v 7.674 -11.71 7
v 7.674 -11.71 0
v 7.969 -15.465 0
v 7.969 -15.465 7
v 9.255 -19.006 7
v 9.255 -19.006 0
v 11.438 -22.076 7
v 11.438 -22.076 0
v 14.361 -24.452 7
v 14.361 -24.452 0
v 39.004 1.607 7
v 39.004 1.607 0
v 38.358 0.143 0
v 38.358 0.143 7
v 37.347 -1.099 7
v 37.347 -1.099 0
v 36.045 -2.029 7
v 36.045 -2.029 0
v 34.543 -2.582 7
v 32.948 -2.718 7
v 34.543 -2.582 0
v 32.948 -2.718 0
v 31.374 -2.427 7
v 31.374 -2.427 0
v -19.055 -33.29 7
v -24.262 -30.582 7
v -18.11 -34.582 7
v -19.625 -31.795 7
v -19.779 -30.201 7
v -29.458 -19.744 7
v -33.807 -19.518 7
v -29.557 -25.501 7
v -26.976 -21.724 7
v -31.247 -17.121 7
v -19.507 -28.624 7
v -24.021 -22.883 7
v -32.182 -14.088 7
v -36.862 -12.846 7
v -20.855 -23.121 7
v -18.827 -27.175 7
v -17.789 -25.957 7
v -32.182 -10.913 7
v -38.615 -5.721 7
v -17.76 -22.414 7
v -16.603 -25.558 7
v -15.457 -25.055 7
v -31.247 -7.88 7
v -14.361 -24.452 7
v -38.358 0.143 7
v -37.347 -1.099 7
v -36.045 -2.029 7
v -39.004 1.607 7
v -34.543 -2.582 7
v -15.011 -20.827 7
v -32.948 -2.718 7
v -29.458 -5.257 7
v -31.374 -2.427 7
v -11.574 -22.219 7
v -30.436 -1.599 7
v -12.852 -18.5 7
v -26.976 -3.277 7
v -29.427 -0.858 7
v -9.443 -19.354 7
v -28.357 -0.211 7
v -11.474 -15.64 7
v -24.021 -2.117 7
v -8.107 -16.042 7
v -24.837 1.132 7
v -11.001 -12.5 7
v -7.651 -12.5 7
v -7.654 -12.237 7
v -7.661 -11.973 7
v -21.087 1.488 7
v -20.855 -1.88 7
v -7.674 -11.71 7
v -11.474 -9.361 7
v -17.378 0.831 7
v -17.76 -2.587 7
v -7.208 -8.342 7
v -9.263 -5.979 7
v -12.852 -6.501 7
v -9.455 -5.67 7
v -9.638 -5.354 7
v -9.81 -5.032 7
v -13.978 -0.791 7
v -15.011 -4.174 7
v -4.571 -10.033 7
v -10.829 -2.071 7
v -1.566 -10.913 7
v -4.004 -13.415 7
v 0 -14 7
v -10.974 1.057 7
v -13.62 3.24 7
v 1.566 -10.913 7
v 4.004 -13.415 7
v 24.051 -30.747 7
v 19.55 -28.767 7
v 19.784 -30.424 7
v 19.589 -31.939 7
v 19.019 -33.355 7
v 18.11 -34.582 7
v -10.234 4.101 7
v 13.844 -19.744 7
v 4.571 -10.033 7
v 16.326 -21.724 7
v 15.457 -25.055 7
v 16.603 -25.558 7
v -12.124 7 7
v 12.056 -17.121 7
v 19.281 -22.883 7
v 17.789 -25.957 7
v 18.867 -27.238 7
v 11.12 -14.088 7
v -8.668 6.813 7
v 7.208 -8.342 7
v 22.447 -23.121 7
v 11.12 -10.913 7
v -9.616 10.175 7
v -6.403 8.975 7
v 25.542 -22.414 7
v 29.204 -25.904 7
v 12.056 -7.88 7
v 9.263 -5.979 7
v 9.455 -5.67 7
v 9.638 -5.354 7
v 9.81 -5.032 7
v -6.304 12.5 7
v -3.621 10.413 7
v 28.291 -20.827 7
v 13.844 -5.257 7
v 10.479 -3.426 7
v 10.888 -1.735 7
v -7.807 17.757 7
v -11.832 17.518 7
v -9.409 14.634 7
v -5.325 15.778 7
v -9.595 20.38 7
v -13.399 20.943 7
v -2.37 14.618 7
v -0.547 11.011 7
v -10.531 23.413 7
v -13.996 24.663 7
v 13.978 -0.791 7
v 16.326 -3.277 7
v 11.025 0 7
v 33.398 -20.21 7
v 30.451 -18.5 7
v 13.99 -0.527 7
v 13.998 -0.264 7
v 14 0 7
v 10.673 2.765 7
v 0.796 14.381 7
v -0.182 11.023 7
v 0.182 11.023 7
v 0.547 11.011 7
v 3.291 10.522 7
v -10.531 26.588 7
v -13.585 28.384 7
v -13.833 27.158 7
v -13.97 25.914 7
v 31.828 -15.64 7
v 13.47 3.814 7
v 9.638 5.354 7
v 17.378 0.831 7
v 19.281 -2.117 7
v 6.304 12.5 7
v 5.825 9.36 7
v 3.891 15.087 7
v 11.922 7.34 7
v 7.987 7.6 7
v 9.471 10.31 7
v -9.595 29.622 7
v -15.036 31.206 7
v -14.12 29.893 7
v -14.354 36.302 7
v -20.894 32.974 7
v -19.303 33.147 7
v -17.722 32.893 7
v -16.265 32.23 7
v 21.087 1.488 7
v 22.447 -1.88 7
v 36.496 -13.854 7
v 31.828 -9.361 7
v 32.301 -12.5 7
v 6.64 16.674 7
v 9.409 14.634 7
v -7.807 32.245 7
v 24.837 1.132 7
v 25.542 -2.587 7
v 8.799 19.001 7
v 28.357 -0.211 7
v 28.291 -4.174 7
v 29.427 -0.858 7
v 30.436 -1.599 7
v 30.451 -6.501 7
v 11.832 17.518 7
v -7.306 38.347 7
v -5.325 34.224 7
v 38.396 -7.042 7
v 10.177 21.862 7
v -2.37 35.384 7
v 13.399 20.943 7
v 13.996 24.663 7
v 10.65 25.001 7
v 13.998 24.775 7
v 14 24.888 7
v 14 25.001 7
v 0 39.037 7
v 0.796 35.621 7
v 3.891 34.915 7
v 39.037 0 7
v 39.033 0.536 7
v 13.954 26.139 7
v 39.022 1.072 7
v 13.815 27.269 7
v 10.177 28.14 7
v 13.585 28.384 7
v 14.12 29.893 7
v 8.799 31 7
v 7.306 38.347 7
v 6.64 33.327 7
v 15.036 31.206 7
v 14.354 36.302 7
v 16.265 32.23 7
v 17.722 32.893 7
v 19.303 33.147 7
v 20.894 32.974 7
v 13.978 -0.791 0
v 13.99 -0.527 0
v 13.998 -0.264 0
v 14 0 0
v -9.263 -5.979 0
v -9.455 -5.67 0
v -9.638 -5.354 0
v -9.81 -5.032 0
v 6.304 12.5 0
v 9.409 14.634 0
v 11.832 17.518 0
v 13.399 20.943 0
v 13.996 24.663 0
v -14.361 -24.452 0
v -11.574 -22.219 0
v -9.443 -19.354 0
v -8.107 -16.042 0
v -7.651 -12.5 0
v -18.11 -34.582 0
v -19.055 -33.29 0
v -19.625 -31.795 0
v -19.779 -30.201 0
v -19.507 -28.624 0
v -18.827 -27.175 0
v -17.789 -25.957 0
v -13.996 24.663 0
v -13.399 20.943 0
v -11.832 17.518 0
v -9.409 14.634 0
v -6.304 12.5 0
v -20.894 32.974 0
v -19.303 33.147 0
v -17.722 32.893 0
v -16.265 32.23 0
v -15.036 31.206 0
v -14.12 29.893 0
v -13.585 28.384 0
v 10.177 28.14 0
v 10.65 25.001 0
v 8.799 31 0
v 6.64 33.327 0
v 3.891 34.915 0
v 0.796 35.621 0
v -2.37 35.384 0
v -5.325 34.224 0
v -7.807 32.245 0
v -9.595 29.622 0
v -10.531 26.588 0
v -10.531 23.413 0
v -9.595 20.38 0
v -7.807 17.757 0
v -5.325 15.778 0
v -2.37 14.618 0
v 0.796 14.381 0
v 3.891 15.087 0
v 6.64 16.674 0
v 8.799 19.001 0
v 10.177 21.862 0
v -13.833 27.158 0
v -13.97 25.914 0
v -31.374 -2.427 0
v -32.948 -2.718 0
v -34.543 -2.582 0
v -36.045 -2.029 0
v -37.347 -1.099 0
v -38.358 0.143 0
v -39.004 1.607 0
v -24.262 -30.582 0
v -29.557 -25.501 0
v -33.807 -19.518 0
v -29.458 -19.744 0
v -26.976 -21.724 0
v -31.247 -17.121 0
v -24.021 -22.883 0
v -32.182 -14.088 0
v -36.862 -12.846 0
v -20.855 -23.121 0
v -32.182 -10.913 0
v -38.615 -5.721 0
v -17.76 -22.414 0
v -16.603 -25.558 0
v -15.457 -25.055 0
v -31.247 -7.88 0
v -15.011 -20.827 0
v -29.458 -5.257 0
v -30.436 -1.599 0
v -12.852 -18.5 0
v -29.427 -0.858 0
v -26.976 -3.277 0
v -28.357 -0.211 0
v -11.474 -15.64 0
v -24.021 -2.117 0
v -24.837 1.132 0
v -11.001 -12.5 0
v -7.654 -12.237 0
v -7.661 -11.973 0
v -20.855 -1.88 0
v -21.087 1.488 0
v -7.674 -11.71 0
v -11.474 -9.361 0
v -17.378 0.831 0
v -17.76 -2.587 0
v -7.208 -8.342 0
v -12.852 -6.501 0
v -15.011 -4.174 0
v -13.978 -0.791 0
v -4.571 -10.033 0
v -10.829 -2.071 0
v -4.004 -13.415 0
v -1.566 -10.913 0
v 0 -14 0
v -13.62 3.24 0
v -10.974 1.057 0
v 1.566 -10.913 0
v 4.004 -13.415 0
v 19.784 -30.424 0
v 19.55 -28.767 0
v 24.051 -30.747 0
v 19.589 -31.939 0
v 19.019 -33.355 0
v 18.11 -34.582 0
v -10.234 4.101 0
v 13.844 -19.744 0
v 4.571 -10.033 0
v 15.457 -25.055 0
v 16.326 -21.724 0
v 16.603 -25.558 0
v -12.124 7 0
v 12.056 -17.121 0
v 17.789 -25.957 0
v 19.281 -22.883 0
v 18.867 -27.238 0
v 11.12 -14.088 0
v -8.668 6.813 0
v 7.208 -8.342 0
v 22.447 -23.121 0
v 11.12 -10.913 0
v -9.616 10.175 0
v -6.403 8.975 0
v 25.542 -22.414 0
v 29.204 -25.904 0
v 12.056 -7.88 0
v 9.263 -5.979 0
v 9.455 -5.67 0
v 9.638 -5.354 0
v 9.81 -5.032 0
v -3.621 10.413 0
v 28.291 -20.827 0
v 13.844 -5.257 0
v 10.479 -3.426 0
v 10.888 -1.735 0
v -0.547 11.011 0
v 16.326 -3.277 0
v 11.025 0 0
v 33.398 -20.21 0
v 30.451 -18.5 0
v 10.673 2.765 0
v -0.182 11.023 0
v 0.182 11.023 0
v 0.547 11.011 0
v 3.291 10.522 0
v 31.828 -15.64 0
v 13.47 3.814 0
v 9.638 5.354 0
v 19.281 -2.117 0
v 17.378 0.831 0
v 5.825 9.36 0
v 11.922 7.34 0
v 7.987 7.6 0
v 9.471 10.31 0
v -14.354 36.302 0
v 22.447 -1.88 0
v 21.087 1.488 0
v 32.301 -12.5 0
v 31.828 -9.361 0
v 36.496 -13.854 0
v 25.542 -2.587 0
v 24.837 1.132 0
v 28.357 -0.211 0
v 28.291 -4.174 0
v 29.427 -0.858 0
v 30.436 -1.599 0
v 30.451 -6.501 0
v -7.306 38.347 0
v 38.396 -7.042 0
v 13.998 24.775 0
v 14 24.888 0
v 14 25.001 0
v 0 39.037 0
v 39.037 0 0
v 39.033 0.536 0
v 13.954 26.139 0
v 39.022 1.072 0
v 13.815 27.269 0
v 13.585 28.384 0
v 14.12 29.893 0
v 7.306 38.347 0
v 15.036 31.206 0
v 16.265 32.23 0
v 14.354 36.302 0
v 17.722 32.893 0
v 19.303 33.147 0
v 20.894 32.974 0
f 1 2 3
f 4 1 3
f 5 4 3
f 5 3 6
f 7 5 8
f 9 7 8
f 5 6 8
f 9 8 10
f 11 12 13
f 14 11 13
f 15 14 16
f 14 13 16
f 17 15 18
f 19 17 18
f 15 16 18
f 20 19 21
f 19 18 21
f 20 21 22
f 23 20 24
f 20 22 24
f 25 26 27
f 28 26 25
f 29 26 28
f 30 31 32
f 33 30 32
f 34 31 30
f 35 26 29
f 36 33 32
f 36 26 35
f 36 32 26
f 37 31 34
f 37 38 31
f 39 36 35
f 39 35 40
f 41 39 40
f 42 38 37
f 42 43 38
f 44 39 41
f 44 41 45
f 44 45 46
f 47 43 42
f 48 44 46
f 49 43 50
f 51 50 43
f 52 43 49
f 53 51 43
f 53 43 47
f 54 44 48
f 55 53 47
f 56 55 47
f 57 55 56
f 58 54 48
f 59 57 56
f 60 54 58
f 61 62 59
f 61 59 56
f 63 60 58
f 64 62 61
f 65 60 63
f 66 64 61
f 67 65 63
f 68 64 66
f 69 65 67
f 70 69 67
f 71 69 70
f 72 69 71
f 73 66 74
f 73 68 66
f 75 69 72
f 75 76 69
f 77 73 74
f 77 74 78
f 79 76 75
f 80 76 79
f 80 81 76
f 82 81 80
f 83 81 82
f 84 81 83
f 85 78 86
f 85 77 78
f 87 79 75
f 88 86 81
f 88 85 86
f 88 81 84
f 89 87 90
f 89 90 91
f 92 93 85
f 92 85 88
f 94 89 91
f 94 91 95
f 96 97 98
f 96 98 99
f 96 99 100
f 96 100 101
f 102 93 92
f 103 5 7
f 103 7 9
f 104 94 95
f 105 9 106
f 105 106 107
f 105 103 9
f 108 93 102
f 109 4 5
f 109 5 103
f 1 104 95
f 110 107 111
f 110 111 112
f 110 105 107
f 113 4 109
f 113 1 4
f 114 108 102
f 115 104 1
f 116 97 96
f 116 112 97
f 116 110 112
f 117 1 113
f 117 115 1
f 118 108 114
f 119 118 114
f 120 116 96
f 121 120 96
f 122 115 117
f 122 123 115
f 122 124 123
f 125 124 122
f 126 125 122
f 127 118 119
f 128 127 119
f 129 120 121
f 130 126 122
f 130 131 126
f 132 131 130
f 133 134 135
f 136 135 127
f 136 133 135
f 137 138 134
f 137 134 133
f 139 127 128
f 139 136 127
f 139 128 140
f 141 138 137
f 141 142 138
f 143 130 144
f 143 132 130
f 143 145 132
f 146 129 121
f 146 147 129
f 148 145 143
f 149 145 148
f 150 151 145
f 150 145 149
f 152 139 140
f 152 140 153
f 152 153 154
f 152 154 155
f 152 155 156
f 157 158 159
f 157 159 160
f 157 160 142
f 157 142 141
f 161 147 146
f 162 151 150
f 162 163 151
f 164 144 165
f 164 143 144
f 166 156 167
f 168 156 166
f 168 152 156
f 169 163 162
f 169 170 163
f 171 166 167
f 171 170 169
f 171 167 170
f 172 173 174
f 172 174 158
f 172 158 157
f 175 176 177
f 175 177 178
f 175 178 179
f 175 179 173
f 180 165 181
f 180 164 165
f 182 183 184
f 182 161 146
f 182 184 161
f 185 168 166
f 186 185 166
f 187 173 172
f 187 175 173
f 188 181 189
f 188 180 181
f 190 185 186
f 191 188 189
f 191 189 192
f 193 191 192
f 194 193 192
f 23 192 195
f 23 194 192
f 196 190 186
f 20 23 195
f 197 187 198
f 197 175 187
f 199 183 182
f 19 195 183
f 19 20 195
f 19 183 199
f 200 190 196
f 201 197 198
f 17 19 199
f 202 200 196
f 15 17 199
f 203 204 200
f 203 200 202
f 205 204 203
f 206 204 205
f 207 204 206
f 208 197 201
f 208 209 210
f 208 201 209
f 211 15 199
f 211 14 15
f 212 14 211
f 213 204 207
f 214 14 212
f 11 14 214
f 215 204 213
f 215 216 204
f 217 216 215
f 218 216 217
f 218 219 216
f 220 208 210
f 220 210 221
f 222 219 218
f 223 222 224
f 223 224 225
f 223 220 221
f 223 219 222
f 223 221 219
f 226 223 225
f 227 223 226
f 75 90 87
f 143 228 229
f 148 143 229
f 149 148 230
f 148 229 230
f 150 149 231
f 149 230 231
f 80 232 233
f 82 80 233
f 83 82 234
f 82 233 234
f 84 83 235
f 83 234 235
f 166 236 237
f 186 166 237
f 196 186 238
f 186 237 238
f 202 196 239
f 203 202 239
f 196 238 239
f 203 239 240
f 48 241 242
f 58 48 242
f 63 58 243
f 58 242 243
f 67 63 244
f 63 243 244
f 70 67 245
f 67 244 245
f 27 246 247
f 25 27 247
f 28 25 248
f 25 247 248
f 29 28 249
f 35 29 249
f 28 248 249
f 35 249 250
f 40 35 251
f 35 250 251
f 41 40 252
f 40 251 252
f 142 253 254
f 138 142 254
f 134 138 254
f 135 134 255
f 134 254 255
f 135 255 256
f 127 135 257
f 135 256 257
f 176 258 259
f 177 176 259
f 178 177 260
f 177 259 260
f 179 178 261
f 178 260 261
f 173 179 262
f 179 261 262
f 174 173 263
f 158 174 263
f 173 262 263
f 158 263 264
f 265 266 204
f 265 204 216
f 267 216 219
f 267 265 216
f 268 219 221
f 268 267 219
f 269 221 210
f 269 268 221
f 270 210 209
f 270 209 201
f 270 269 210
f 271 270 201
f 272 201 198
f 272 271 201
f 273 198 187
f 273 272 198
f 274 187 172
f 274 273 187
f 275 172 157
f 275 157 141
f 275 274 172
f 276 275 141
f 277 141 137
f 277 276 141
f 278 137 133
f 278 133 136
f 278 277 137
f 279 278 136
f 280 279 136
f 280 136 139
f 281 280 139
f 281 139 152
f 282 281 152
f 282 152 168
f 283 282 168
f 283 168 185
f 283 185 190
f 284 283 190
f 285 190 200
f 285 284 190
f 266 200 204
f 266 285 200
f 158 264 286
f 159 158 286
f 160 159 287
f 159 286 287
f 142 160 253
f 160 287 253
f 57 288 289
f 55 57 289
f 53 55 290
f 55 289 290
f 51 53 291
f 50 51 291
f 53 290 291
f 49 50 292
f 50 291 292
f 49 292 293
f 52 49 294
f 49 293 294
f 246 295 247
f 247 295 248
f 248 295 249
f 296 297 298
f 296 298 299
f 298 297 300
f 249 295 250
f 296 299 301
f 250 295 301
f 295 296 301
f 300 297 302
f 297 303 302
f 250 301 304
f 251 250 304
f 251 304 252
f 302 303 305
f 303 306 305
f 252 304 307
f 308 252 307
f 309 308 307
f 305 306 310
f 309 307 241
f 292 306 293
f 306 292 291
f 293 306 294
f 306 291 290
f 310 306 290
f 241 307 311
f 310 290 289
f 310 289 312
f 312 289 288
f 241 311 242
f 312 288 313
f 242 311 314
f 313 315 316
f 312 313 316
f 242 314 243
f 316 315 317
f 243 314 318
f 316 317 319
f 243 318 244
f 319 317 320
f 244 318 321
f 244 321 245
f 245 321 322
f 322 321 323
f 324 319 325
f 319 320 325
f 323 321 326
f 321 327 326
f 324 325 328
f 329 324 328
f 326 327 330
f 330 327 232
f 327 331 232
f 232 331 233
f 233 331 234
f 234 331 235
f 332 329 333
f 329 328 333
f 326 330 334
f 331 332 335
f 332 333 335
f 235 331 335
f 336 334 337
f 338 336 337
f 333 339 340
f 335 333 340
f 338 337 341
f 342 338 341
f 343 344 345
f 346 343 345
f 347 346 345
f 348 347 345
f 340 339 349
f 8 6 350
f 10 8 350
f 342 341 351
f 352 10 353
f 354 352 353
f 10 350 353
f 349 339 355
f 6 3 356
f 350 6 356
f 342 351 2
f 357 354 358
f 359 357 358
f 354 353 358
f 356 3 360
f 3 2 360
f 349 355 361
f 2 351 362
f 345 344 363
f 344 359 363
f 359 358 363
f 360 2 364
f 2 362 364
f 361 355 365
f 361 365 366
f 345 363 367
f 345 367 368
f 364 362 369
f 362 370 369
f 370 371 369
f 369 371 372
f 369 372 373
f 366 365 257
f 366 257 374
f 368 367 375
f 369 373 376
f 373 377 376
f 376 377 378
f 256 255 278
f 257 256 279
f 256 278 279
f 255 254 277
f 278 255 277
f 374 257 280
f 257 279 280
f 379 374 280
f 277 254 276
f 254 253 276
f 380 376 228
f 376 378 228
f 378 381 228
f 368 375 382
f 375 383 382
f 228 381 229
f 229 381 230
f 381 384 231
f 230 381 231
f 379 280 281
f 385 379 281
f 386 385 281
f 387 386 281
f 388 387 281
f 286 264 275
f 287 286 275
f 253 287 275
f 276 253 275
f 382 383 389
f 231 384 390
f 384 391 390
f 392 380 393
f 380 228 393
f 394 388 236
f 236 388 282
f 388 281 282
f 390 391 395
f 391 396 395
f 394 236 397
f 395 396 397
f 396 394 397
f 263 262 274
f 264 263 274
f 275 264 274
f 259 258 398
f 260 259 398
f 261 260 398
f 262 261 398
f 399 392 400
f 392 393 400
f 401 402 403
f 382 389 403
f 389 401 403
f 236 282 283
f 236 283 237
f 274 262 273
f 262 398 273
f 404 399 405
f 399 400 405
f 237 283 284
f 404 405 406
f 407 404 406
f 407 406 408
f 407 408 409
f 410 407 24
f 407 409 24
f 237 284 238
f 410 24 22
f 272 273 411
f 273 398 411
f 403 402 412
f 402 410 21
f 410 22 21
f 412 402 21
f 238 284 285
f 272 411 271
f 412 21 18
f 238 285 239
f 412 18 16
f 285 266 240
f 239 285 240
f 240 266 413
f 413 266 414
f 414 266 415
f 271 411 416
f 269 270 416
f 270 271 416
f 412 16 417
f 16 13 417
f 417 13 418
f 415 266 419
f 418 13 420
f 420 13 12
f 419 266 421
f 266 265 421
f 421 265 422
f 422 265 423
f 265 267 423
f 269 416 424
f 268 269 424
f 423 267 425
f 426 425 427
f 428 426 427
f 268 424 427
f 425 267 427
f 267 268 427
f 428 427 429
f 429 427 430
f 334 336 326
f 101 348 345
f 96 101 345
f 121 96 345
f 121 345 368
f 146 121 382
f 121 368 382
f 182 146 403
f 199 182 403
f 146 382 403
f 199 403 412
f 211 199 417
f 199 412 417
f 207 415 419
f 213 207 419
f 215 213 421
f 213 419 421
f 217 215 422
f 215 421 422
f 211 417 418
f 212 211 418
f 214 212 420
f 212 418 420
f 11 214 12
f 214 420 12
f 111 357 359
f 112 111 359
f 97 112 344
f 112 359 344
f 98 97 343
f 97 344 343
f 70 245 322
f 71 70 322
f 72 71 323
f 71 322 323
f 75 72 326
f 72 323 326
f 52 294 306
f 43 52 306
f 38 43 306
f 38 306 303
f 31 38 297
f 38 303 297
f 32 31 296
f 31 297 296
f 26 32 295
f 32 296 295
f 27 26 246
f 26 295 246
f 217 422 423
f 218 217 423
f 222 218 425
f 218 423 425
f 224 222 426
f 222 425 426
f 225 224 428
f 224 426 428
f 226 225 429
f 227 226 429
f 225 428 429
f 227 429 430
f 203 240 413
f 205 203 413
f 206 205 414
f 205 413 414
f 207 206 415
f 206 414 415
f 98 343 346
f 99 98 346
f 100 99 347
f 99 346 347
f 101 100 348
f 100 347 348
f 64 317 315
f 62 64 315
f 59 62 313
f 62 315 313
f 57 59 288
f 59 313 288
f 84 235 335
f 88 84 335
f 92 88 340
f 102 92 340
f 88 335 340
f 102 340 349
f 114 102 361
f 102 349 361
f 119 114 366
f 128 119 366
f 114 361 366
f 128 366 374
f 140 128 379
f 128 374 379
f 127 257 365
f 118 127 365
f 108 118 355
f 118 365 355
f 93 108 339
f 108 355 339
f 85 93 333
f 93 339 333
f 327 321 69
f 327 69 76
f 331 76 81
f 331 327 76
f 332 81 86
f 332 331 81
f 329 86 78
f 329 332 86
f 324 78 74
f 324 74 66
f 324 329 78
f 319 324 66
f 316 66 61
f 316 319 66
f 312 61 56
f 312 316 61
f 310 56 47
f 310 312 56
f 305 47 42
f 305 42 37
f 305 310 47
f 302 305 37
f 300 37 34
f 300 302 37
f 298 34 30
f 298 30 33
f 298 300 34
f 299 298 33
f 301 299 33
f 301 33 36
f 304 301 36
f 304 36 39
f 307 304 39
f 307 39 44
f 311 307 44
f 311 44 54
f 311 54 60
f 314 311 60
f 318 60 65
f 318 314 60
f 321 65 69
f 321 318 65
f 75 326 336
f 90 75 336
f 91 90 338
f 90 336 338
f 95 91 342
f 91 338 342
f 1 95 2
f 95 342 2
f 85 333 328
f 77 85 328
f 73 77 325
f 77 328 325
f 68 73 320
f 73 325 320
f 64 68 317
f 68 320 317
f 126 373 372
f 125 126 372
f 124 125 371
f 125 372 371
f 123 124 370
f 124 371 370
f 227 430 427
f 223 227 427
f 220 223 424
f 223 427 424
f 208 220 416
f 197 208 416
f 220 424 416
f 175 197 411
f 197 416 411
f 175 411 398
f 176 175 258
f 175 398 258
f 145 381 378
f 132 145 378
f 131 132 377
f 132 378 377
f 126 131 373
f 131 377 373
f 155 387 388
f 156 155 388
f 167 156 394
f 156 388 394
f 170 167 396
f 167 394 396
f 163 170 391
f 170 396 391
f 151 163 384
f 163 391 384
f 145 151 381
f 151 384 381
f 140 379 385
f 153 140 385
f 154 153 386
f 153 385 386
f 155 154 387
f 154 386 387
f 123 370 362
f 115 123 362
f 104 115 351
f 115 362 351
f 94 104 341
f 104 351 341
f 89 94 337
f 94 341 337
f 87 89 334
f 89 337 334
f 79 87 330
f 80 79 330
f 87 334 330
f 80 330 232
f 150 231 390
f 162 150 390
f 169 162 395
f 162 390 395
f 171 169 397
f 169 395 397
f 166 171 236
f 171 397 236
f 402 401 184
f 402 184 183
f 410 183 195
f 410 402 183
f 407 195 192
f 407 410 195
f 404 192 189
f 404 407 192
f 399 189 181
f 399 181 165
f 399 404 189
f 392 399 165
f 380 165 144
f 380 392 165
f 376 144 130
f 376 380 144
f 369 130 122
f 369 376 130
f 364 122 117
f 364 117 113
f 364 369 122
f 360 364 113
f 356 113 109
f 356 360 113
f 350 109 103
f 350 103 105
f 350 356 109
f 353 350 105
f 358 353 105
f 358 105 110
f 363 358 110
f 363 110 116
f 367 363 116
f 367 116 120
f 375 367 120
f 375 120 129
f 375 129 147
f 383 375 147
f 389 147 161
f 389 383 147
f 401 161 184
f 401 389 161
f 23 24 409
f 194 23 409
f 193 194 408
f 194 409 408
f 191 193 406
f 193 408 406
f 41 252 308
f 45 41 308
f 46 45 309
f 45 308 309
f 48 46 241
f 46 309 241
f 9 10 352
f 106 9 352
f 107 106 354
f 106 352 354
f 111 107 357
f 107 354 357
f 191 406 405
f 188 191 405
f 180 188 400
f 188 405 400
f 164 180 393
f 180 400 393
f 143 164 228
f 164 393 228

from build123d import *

# Parameters (mm, degrees)
F0_R     = 10.65
F1_DEPTH = 7


with BuildPart() as f1:
    # F0 (on Top) → F1 (new body)
    with BuildSketch(Plane.XY):
        with BuildLine():
            ThreePointArc((-13.5850223899, 28.3841313799), (0, 39.0007652062), (13.5850223899, 28.3841313799))
            ThreePointArc((13.5850223899, 28.3841313799), (16.2654595363, 32.2301803319), (20.8939522359, 32.9744189809))
            ThreePointArc((20.8939522359, 32.9744189809), (0, 39.0367717308), (-20.8939522359, 32.9744189809))
            ThreePointArc((-20.8939522359, 32.9744189809), (-16.2654595363, 32.2301803319), (-13.5850223899, 28.3841313799))
        make_face()
        with BuildLine():
            ThreePointArc((-17.7888676444, -25.9570401906), (-33.7756534356, -19.5003826031), (-31.3738900343, -2.4270911893))
            ThreePointArc((-31.3738900343, -2.4270911893), (-36.0448847041, -2.0287890033), (-39.0036606305, 1.6074839313))
            ThreePointArc((-39.0036606305, 1.6074839313), (-33.8068360006, -19.5183858654), (-18.1097083945, -34.5819029122))
            ThreePointArc((-18.1097083945, -34.5819029122), (-19.7794251679, -30.2013913286), (-17.7888676444, -25.9570401906))
        make_face()
        with BuildLine():
            ThreePointArc((39.0036606305, 1.6074839313), (36.0448847041, -2.0287890033), (31.3738900343, -2.4270911893))
            ThreePointArc((31.3738900343, -2.4270911893), (34.537652805, -7.0284675601), (35.6512977827, -12.5003826031))
            ThreePointArc((35.6512977827, -12.5003826031), (30.0752510726, -23.6823775489), (17.7888676444, -25.9570401906))
            ThreePointArc((17.7888676444, -25.9570401906), (19.2622478562, -27.9781893195), (19.783572277, -30.424434176))
            ThreePointArc((19.783572277, -30.424434176), (19.3493973149, -32.6653249916), (18.1097083945, -34.5819029122))
            ThreePointArc((18.1097083945, -34.5819029122), (33.3977102499, -20.2104551465), (39.0367717308, 0))
            ThreePointArc((39.0367717308, 0), (39.0284930779, 0.8039124539), (39.0036606305, 1.6074839313))
        make_face()
        with BuildLine():
            ThreePointArc((-6.3040014892, 12.5003826031), (0, 14), (6.3040014892, 12.5003826031))
            ThreePointArc((6.3040014892, 12.5003826031), (11.832295091, 17.5176647206), (13.9959216435, 24.6628638175))
            ThreePointArc((13.9959216435, 24.6628638175), (13.4927928191, 26.4906281105), (13.5850223899, 28.3841313799))
            ThreePointArc((13.5850223899, 28.3841313799), (0, 39.0007652062), (-13.5850223899, 28.3841313799))
            ThreePointArc((-13.5850223899, 28.3841313799), (-13.4887520947, 27.7699684348), (-13.4565467536, 27.1491408348))
            ThreePointArc((-13.4565467536, 27.1491408348), (-13.592940753, 25.8770855413), (-13.9959216435, 24.6628638175))
            ThreePointArc((-13.9959216435, 24.6628638175), (-11.832295091, 17.5176647206), (-6.3040014892, 12.5003826031))
        make_face()
        with Locations((0, 25.0007652062)):
            Circle(F0_R, mode=Mode.SUBTRACT)
        with BuildLine():
            ThreePointArc((0.5466252979, 11.011440677), (7.9867755981, 7.6001342452), (11.025, 0))
            ThreePointArc((11.025, 0), (10.7168176849, -2.5885215294), (9.8095000075, -5.0323289441))
            ThreePointArc((9.8095000075, -5.0323289441), (11.6657646613, -2.6876802087), (13.9776496359, -0.7907658664))
            ThreePointArc((13.9776496359, -0.7907658664), (13.9944112935, -0.3955408305), (14, 0))
            ThreePointArc((14, 0), (11.9217452759, 7.3397540542), (6.3040014892, 12.5003826031))
            ThreePointArc((6.3040014892, 12.5003826031), (3.5052829927, 11.4466886556), (0.5466252979, 11.011440677))
        make_face()
        with BuildLine():
            ThreePointArc((-9.8095000075, -5.0323289441), (-9.5479300767, 5.5125), (-0.5466252979, 11.011440677))
            ThreePointArc((-0.5466252979, 11.011440677), (-3.5052829927, 11.4466886556), (-6.3040014892, 12.5003826031))
            ThreePointArc((-6.3040014892, 12.5003826031), (-12.124355653, 7), (-13.9776496359, -0.7907658664))
            ThreePointArc((-13.9776496359, -0.7907658664), (-11.6657646613, -2.6876802087), (-9.8095000075, -5.0323289441))
        make_face()
        with BuildLine():
            ThreePointArc((-9.2628747096, -5.9791117329), (-9.5479300767, -5.5125), (-9.8095000075, -5.0323289441))
            ThreePointArc((-9.8095000075, -5.0323289441), (-11.6657646613, -2.6876802087), (-13.9776496359, -0.7907658664))
            ThreePointArc((-13.9776496359, -0.7907658664), (-12.124355653, -7), (-7.6736481467, -11.7096167367))
            ThreePointArc((-7.6736481467, -11.7096167367), (-8.1604816686, -8.7590084469), (-9.2628747096, -5.9791117329))
        make_face()
        with BuildLine():
            ThreePointArc((7.6736481467, -11.7096167367), (8.1604816686, -8.7590084469), (9.2628747096, -5.9791117329))
            ThreePointArc((9.2628747096, -5.9791117329), (0, -11.025), (-9.2628747096, -5.9791117329))
            ThreePointArc((-9.2628747096, -5.9791117329), (-8.1604816686, -8.7590084469), (-7.6736481467, -11.7096167367))
            ThreePointArc((-7.6736481467, -11.7096167367), (0, -14), (7.6736481467, -11.7096167367))
        make_face()
        with BuildLine():
            ThreePointArc((-0.5466252979, 11.011440677), (0, 11.025), (0.5466252979, 11.011440677))
            ThreePointArc((0.5466252979, 11.011440677), (3.5052829927, 11.4466886556), (6.3040014892, 12.5003826031))
            ThreePointArc((6.3040014892, 12.5003826031), (0, 14), (-6.3040014892, 12.5003826031))
            ThreePointArc((-6.3040014892, 12.5003826031), (-3.5052829927, 11.4466886556), (-0.5466252979, 11.011440677))
        make_face()
        with BuildLine():
            ThreePointArc((13.9776496359, -0.7907658664), (11.6657646613, -2.6876802087), (9.8095000075, -5.0323289441))
            ThreePointArc((9.8095000075, -5.0323289441), (9.5479300767, -5.5125), (9.2628747096, -5.9791117329))
            ThreePointArc((9.2628747096, -5.9791117329), (8.1604816686, -8.7590084469), (7.6736481467, -11.7096167367))
            ThreePointArc((7.6736481467, -11.7096167367), (12.124355653, -7), (13.9776496359, -0.7907658664))
        make_face()
        with BuildLine():
            ThreePointArc((28.3566274178, -0.2106082161), (21.0868902085, 1.4882357736), (13.9776496359, -0.7907658664))
            ThreePointArc((13.9776496359, -0.7907658664), (12.124355653, -7), (7.6736481467, -11.7096167367))
            ThreePointArc((7.6736481467, -11.7096167367), (9.2545951175, -19.0059004942), (14.3607057743, -24.4522556014))
            ThreePointArc((14.3607057743, -24.4522556014), (16.1951604964, -24.9304154046), (17.7888676444, -25.9570401906))
            ThreePointArc((17.7888676444, -25.9570401906), (30.0752510726, -23.6823775489), (35.6512977827, -12.5003826031))
            ThreePointArc((35.6512977827, -12.5003826031), (34.537652805, -7.0284675601), (31.3738900343, -2.4270911893))
            ThreePointArc((31.3738900343, -2.4270911893), (29.6879533155, -1.5602127059), (28.3566274178, -0.2106082161))
        make_face()
        with Locations((21.6512977827, -12.5003826031)):
            Circle(F0_R, mode=Mode.SUBTRACT)
        with BuildLine():
            ThreePointArc((-7.6736481467, -11.7096167367), (-12.124355653, -7), (-13.9776496359, -0.7907658664))
            ThreePointArc((-13.9776496359, -0.7907658664), (-21.0868902085, 1.4882357736), (-28.3566274178, -0.2106082161))
            ThreePointArc((-28.3566274178, -0.2106082161), (-29.6879533155, -1.5602127059), (-31.3738900343, -2.4270911893))
            ThreePointArc((-31.3738900343, -2.4270911893), (-33.7756534356, -19.5003826031), (-17.7888676444, -25.9570401906))
            ThreePointArc((-17.7888676444, -25.9570401906), (-16.1951604964, -24.9304154046), (-14.3607057743, -24.4522556014))
            ThreePointArc((-14.3607057743, -24.4522556014), (-9.4433436519, -19.3535465397), (-7.6512977827, -12.5003826031))
            ThreePointArc((-7.6512977827, -12.5003826031), (-7.6568864892, -12.1048417726), (-7.6736481467, -11.7096167367))
        make_face()
        with Locations((-21.6512977827, -12.5003826031)):
            Circle(F0_R, mode=Mode.SUBTRACT)
        with BuildLine():
            ThreePointArc((-31.3738900343, -2.4270911893), (-29.6879533155, -1.5602127059), (-28.3566274178, -0.2106082161))
            ThreePointArc((-28.3566274178, -0.2106082161), (-29.9396844515, -1.2175351599), (-31.3738900343, -2.4270911893))
        make_face()
        with BuildLine():
            ThreePointArc((-13.5850223899, 28.3841313799), (-13.9154258473, 26.5372948962), (-13.9959216435, 24.6628638175))
            ThreePointArc((-13.9959216435, 24.6628638175), (-13.592940753, 25.8770855413), (-13.4565467536, 27.1491408348))
            ThreePointArc((-13.4565467536, 27.1491408348), (-13.4887520947, 27.7699684348), (-13.5850223899, 28.3841313799))
        make_face()
        with BuildLine():
            ThreePointArc((13.5850223899, 28.3841313799), (13.4927928191, 26.4906281105), (13.9959216435, 24.6628638175))
            ThreePointArc((13.9959216435, 24.6628638175), (13.9989803737, 24.8318022062), (14, 25.0007652062))
            ThreePointArc((14, 25.0007652062), (13.8958683331, 26.7051252828), (13.5850223899, 28.3841313799))
        make_face()
        with BuildLine():
            ThreePointArc((31.3738900343, -2.4270911893), (29.9396844515, -1.2175351599), (28.3566274178, -0.2106082161))
            ThreePointArc((28.3566274178, -0.2106082161), (29.6879533155, -1.5602127059), (31.3738900343, -2.4270911893))
        make_face()
        with BuildLine():
            ThreePointArc((17.7888676444, -25.9570401906), (16.1951604964, -24.9304154046), (14.3607057743, -24.4522556014))
            ThreePointArc((14.3607057743, -24.4522556014), (16.0242586042, -25.3197597364), (17.7888676444, -25.9570401906))
        make_face()
        with BuildLine():
            ThreePointArc((-17.7888676444, -25.9570401906), (-16.0242586042, -25.3197597364), (-14.3607057743, -24.4522556014))
            ThreePointArc((-14.3607057743, -24.4522556014), (-16.1951604964, -24.9304154046), (-17.7888676444, -25.9570401906))
        make_face()
    extrude(amount=F1_DEPTH)


solid = f1.part
